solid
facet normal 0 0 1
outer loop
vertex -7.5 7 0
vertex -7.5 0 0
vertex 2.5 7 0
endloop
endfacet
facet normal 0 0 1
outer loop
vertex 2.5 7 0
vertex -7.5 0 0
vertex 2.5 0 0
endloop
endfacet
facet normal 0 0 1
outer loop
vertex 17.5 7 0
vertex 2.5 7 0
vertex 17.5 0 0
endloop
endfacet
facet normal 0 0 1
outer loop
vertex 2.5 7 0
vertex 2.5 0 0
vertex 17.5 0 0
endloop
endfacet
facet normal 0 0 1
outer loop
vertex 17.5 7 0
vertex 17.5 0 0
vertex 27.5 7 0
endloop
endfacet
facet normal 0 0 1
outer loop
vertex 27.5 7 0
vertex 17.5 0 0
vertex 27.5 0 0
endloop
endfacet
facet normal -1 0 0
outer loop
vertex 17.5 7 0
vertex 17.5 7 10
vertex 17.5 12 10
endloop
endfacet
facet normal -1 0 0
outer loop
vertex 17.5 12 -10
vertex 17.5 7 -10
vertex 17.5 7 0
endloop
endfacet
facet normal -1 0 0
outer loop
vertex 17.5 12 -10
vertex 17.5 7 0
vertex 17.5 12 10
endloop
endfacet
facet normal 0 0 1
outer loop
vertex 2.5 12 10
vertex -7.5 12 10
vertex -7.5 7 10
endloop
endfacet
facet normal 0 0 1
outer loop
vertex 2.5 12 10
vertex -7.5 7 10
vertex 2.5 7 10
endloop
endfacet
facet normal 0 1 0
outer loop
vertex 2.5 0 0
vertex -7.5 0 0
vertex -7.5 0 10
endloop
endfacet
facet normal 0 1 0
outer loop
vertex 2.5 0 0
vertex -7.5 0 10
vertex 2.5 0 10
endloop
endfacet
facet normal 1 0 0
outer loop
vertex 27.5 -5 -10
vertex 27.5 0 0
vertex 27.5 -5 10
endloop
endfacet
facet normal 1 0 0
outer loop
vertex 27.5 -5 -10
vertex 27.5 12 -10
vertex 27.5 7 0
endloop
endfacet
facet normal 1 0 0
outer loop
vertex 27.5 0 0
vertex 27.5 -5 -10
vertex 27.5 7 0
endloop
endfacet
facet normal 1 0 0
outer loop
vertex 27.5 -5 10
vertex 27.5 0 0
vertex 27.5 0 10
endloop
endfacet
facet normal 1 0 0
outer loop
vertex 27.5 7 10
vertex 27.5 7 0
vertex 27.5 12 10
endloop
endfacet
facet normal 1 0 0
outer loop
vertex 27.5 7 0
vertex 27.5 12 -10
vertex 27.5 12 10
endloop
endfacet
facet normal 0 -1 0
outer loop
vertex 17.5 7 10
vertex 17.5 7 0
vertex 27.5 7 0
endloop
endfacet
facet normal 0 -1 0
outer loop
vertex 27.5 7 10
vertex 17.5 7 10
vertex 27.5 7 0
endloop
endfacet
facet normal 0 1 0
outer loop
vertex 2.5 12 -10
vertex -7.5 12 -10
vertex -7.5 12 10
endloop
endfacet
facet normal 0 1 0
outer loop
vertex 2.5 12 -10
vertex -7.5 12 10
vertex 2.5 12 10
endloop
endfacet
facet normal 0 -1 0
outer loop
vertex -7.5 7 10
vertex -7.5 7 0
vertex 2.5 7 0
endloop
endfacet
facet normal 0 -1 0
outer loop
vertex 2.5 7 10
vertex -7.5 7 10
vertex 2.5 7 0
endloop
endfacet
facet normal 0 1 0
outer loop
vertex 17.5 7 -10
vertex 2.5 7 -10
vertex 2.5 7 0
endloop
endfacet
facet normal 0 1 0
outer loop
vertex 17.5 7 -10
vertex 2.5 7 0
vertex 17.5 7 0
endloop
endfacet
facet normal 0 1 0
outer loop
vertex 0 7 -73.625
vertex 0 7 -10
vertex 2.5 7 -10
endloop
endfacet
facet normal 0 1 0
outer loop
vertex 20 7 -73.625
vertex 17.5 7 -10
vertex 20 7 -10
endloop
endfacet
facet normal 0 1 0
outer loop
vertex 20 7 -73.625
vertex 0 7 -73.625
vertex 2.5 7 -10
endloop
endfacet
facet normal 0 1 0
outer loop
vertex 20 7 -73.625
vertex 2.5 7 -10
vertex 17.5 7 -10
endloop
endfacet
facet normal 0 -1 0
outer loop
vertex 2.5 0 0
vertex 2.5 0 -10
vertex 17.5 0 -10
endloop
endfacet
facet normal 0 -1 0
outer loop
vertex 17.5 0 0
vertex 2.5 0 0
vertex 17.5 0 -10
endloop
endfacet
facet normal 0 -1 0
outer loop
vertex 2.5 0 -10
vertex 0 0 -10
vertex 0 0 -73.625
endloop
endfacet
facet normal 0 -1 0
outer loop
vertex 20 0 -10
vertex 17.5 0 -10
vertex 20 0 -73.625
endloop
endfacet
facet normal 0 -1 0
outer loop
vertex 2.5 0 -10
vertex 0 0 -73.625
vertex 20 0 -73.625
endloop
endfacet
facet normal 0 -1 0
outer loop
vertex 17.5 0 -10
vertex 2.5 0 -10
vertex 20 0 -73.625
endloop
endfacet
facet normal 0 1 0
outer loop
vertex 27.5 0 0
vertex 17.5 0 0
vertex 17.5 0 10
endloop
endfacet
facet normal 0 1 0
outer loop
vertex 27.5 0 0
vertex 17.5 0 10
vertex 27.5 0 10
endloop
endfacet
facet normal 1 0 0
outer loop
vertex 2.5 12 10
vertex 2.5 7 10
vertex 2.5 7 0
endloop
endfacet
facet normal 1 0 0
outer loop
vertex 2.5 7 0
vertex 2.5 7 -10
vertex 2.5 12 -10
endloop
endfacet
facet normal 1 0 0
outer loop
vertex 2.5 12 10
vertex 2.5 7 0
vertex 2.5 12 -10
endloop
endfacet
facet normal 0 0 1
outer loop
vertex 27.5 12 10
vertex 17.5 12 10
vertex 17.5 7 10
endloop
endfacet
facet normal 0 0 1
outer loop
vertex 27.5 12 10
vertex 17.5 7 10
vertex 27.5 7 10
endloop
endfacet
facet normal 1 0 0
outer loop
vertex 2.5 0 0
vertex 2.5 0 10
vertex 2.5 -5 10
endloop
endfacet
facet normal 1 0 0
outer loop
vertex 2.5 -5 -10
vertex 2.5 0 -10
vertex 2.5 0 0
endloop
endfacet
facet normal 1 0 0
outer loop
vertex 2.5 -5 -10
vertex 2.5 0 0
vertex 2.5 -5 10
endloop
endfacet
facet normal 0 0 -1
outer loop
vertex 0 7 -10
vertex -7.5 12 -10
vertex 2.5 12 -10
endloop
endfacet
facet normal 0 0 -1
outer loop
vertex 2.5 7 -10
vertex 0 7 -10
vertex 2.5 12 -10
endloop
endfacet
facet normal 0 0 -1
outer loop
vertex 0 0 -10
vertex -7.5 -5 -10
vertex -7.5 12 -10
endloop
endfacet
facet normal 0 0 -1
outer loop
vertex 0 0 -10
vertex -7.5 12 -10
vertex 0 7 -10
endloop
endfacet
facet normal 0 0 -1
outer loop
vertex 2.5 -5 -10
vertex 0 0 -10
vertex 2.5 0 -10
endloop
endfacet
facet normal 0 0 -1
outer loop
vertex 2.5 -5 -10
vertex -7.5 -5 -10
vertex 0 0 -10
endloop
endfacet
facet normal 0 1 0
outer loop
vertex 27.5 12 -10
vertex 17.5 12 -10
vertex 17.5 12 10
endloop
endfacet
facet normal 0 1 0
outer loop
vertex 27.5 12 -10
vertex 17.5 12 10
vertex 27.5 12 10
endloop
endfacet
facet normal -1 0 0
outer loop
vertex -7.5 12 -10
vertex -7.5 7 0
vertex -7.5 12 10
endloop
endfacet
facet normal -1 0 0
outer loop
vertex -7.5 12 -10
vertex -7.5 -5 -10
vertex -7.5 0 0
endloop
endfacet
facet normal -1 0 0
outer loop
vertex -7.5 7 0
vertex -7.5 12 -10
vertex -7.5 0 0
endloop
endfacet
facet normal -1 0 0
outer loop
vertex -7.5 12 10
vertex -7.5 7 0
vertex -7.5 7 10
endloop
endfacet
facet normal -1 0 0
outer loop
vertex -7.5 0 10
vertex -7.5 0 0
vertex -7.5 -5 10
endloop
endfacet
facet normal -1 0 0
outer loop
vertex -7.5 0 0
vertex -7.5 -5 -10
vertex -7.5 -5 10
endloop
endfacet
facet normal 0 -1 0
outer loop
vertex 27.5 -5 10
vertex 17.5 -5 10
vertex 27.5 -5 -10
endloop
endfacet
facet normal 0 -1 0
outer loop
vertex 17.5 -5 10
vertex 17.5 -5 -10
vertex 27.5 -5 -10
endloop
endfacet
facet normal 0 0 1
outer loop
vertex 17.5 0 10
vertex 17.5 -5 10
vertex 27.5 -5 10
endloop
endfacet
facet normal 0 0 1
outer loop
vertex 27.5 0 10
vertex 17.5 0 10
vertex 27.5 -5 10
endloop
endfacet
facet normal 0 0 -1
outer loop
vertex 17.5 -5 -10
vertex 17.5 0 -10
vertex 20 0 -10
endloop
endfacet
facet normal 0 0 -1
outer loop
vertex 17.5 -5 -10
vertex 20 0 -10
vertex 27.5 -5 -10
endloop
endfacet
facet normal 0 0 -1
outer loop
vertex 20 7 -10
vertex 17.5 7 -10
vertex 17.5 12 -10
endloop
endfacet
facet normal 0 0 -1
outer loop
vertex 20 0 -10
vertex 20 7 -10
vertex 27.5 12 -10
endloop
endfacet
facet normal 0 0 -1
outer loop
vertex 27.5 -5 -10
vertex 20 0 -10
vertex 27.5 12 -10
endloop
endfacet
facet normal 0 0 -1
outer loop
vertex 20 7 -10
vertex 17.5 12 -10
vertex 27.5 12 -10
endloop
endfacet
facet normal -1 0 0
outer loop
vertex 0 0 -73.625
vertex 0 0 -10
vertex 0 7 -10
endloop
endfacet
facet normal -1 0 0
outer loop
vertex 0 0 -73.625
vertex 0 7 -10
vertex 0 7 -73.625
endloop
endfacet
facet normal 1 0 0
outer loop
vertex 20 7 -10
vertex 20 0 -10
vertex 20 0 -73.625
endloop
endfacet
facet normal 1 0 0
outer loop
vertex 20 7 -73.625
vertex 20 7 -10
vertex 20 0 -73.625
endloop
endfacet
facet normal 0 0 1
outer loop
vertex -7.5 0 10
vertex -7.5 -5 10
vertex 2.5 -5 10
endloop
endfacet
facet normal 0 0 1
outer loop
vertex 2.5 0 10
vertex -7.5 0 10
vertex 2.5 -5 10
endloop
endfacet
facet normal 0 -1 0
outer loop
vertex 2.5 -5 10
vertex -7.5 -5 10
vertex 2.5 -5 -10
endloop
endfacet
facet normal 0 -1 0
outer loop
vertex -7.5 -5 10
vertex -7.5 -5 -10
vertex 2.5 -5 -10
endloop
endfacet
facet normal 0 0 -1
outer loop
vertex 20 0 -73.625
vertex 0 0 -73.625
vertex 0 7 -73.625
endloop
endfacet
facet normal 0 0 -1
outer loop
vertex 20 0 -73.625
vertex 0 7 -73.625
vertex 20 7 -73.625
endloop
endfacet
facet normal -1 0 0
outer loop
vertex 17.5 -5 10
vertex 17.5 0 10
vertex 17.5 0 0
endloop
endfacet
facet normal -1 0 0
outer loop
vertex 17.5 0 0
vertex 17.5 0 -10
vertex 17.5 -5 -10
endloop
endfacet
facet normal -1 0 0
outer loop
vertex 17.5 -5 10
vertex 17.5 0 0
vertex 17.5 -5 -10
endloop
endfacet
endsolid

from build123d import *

# Parameters (mm, degrees)
SKETCH1_W           = 20
SKETCH1_H           = 73.625466435
BOSS_EXTRUDE1_DEPTH = 7
SKETCH2_W           = 10
SKETCH2_H           = 10
BOSS_EXTRUDE2_DEPTH = 5
SKETCH3_W           = 10
SKETCH3_H           = 5
BOSS_EXTRUDE3_DEPTH = 10
SKETCH4_W           = 7.5
SKETCH4_H           = 10
BOSS_EXTRUDE4_DEPTH = 3.5


with BuildPart() as part:
    # Sketch1 → Boss-Extrude1 (new body)
    with BuildSketch(Plane(origin=(0, 0, 0), x_dir=(1, 0, 0), z_dir=(0, 1, 0))):
        with Locations((10, 36.812733218)):
            Rectangle(SKETCH1_W, SKETCH1_H)
    extrude(amount=BOSS_EXTRUDE1_DEPTH)

    # Sketch2 → Boss-Extrude2 (add)
    with BuildSketch(Plane(origin=(0, 7, 0), x_dir=(1, 0, 0), z_dir=(0, 1, 0))):
        with Locations((-2.5, 5)):
            Rectangle(SKETCH2_W, SKETCH2_H)
        with Locations((22.5, 5)):
            Rectangle(SKETCH2_W, SKETCH2_H)
    boss_extrude2 = extrude(amount=BOSS_EXTRUDE2_DEPTH)

    # Sketch3 → Boss-Extrude3 (add)
    with BuildSketch(Plane.XY):
        with Locations((-2.5, 9.5)):
            Rectangle(SKETCH3_W, SKETCH3_H)
        with Locations((22.5, 9.5)):
            Rectangle(SKETCH3_W, SKETCH3_H)
    boss_extrude3 = extrude(amount=BOSS_EXTRUDE3_DEPTH)

    # Sketch4 → Boss-Extrude4 (add)
    with BuildSketch(Plane.XZ.offset(-7)):
        with Locations((-3.75, -5)):
            Rectangle(SKETCH4_W, SKETCH4_H)
        with Locations((23.75, -5)):
            Rectangle(SKETCH4_W, SKETCH4_H)
    boss_extrude4 = extrude(amount=BOSS_EXTRUDE4_DEPTH)

    # Mirror1: Boss-Extrude2, Boss-Extrude3, Boss-Extrude4 across plane
    add(boss_extrude2.mirror(Plane.ZX.offset(3.5)))
    add(boss_extrude3.mirror(Plane.ZX.offset(3.5)))
    add(boss_extrude4.mirror(Plane.ZX.offset(3.5)))


solid = part.part
